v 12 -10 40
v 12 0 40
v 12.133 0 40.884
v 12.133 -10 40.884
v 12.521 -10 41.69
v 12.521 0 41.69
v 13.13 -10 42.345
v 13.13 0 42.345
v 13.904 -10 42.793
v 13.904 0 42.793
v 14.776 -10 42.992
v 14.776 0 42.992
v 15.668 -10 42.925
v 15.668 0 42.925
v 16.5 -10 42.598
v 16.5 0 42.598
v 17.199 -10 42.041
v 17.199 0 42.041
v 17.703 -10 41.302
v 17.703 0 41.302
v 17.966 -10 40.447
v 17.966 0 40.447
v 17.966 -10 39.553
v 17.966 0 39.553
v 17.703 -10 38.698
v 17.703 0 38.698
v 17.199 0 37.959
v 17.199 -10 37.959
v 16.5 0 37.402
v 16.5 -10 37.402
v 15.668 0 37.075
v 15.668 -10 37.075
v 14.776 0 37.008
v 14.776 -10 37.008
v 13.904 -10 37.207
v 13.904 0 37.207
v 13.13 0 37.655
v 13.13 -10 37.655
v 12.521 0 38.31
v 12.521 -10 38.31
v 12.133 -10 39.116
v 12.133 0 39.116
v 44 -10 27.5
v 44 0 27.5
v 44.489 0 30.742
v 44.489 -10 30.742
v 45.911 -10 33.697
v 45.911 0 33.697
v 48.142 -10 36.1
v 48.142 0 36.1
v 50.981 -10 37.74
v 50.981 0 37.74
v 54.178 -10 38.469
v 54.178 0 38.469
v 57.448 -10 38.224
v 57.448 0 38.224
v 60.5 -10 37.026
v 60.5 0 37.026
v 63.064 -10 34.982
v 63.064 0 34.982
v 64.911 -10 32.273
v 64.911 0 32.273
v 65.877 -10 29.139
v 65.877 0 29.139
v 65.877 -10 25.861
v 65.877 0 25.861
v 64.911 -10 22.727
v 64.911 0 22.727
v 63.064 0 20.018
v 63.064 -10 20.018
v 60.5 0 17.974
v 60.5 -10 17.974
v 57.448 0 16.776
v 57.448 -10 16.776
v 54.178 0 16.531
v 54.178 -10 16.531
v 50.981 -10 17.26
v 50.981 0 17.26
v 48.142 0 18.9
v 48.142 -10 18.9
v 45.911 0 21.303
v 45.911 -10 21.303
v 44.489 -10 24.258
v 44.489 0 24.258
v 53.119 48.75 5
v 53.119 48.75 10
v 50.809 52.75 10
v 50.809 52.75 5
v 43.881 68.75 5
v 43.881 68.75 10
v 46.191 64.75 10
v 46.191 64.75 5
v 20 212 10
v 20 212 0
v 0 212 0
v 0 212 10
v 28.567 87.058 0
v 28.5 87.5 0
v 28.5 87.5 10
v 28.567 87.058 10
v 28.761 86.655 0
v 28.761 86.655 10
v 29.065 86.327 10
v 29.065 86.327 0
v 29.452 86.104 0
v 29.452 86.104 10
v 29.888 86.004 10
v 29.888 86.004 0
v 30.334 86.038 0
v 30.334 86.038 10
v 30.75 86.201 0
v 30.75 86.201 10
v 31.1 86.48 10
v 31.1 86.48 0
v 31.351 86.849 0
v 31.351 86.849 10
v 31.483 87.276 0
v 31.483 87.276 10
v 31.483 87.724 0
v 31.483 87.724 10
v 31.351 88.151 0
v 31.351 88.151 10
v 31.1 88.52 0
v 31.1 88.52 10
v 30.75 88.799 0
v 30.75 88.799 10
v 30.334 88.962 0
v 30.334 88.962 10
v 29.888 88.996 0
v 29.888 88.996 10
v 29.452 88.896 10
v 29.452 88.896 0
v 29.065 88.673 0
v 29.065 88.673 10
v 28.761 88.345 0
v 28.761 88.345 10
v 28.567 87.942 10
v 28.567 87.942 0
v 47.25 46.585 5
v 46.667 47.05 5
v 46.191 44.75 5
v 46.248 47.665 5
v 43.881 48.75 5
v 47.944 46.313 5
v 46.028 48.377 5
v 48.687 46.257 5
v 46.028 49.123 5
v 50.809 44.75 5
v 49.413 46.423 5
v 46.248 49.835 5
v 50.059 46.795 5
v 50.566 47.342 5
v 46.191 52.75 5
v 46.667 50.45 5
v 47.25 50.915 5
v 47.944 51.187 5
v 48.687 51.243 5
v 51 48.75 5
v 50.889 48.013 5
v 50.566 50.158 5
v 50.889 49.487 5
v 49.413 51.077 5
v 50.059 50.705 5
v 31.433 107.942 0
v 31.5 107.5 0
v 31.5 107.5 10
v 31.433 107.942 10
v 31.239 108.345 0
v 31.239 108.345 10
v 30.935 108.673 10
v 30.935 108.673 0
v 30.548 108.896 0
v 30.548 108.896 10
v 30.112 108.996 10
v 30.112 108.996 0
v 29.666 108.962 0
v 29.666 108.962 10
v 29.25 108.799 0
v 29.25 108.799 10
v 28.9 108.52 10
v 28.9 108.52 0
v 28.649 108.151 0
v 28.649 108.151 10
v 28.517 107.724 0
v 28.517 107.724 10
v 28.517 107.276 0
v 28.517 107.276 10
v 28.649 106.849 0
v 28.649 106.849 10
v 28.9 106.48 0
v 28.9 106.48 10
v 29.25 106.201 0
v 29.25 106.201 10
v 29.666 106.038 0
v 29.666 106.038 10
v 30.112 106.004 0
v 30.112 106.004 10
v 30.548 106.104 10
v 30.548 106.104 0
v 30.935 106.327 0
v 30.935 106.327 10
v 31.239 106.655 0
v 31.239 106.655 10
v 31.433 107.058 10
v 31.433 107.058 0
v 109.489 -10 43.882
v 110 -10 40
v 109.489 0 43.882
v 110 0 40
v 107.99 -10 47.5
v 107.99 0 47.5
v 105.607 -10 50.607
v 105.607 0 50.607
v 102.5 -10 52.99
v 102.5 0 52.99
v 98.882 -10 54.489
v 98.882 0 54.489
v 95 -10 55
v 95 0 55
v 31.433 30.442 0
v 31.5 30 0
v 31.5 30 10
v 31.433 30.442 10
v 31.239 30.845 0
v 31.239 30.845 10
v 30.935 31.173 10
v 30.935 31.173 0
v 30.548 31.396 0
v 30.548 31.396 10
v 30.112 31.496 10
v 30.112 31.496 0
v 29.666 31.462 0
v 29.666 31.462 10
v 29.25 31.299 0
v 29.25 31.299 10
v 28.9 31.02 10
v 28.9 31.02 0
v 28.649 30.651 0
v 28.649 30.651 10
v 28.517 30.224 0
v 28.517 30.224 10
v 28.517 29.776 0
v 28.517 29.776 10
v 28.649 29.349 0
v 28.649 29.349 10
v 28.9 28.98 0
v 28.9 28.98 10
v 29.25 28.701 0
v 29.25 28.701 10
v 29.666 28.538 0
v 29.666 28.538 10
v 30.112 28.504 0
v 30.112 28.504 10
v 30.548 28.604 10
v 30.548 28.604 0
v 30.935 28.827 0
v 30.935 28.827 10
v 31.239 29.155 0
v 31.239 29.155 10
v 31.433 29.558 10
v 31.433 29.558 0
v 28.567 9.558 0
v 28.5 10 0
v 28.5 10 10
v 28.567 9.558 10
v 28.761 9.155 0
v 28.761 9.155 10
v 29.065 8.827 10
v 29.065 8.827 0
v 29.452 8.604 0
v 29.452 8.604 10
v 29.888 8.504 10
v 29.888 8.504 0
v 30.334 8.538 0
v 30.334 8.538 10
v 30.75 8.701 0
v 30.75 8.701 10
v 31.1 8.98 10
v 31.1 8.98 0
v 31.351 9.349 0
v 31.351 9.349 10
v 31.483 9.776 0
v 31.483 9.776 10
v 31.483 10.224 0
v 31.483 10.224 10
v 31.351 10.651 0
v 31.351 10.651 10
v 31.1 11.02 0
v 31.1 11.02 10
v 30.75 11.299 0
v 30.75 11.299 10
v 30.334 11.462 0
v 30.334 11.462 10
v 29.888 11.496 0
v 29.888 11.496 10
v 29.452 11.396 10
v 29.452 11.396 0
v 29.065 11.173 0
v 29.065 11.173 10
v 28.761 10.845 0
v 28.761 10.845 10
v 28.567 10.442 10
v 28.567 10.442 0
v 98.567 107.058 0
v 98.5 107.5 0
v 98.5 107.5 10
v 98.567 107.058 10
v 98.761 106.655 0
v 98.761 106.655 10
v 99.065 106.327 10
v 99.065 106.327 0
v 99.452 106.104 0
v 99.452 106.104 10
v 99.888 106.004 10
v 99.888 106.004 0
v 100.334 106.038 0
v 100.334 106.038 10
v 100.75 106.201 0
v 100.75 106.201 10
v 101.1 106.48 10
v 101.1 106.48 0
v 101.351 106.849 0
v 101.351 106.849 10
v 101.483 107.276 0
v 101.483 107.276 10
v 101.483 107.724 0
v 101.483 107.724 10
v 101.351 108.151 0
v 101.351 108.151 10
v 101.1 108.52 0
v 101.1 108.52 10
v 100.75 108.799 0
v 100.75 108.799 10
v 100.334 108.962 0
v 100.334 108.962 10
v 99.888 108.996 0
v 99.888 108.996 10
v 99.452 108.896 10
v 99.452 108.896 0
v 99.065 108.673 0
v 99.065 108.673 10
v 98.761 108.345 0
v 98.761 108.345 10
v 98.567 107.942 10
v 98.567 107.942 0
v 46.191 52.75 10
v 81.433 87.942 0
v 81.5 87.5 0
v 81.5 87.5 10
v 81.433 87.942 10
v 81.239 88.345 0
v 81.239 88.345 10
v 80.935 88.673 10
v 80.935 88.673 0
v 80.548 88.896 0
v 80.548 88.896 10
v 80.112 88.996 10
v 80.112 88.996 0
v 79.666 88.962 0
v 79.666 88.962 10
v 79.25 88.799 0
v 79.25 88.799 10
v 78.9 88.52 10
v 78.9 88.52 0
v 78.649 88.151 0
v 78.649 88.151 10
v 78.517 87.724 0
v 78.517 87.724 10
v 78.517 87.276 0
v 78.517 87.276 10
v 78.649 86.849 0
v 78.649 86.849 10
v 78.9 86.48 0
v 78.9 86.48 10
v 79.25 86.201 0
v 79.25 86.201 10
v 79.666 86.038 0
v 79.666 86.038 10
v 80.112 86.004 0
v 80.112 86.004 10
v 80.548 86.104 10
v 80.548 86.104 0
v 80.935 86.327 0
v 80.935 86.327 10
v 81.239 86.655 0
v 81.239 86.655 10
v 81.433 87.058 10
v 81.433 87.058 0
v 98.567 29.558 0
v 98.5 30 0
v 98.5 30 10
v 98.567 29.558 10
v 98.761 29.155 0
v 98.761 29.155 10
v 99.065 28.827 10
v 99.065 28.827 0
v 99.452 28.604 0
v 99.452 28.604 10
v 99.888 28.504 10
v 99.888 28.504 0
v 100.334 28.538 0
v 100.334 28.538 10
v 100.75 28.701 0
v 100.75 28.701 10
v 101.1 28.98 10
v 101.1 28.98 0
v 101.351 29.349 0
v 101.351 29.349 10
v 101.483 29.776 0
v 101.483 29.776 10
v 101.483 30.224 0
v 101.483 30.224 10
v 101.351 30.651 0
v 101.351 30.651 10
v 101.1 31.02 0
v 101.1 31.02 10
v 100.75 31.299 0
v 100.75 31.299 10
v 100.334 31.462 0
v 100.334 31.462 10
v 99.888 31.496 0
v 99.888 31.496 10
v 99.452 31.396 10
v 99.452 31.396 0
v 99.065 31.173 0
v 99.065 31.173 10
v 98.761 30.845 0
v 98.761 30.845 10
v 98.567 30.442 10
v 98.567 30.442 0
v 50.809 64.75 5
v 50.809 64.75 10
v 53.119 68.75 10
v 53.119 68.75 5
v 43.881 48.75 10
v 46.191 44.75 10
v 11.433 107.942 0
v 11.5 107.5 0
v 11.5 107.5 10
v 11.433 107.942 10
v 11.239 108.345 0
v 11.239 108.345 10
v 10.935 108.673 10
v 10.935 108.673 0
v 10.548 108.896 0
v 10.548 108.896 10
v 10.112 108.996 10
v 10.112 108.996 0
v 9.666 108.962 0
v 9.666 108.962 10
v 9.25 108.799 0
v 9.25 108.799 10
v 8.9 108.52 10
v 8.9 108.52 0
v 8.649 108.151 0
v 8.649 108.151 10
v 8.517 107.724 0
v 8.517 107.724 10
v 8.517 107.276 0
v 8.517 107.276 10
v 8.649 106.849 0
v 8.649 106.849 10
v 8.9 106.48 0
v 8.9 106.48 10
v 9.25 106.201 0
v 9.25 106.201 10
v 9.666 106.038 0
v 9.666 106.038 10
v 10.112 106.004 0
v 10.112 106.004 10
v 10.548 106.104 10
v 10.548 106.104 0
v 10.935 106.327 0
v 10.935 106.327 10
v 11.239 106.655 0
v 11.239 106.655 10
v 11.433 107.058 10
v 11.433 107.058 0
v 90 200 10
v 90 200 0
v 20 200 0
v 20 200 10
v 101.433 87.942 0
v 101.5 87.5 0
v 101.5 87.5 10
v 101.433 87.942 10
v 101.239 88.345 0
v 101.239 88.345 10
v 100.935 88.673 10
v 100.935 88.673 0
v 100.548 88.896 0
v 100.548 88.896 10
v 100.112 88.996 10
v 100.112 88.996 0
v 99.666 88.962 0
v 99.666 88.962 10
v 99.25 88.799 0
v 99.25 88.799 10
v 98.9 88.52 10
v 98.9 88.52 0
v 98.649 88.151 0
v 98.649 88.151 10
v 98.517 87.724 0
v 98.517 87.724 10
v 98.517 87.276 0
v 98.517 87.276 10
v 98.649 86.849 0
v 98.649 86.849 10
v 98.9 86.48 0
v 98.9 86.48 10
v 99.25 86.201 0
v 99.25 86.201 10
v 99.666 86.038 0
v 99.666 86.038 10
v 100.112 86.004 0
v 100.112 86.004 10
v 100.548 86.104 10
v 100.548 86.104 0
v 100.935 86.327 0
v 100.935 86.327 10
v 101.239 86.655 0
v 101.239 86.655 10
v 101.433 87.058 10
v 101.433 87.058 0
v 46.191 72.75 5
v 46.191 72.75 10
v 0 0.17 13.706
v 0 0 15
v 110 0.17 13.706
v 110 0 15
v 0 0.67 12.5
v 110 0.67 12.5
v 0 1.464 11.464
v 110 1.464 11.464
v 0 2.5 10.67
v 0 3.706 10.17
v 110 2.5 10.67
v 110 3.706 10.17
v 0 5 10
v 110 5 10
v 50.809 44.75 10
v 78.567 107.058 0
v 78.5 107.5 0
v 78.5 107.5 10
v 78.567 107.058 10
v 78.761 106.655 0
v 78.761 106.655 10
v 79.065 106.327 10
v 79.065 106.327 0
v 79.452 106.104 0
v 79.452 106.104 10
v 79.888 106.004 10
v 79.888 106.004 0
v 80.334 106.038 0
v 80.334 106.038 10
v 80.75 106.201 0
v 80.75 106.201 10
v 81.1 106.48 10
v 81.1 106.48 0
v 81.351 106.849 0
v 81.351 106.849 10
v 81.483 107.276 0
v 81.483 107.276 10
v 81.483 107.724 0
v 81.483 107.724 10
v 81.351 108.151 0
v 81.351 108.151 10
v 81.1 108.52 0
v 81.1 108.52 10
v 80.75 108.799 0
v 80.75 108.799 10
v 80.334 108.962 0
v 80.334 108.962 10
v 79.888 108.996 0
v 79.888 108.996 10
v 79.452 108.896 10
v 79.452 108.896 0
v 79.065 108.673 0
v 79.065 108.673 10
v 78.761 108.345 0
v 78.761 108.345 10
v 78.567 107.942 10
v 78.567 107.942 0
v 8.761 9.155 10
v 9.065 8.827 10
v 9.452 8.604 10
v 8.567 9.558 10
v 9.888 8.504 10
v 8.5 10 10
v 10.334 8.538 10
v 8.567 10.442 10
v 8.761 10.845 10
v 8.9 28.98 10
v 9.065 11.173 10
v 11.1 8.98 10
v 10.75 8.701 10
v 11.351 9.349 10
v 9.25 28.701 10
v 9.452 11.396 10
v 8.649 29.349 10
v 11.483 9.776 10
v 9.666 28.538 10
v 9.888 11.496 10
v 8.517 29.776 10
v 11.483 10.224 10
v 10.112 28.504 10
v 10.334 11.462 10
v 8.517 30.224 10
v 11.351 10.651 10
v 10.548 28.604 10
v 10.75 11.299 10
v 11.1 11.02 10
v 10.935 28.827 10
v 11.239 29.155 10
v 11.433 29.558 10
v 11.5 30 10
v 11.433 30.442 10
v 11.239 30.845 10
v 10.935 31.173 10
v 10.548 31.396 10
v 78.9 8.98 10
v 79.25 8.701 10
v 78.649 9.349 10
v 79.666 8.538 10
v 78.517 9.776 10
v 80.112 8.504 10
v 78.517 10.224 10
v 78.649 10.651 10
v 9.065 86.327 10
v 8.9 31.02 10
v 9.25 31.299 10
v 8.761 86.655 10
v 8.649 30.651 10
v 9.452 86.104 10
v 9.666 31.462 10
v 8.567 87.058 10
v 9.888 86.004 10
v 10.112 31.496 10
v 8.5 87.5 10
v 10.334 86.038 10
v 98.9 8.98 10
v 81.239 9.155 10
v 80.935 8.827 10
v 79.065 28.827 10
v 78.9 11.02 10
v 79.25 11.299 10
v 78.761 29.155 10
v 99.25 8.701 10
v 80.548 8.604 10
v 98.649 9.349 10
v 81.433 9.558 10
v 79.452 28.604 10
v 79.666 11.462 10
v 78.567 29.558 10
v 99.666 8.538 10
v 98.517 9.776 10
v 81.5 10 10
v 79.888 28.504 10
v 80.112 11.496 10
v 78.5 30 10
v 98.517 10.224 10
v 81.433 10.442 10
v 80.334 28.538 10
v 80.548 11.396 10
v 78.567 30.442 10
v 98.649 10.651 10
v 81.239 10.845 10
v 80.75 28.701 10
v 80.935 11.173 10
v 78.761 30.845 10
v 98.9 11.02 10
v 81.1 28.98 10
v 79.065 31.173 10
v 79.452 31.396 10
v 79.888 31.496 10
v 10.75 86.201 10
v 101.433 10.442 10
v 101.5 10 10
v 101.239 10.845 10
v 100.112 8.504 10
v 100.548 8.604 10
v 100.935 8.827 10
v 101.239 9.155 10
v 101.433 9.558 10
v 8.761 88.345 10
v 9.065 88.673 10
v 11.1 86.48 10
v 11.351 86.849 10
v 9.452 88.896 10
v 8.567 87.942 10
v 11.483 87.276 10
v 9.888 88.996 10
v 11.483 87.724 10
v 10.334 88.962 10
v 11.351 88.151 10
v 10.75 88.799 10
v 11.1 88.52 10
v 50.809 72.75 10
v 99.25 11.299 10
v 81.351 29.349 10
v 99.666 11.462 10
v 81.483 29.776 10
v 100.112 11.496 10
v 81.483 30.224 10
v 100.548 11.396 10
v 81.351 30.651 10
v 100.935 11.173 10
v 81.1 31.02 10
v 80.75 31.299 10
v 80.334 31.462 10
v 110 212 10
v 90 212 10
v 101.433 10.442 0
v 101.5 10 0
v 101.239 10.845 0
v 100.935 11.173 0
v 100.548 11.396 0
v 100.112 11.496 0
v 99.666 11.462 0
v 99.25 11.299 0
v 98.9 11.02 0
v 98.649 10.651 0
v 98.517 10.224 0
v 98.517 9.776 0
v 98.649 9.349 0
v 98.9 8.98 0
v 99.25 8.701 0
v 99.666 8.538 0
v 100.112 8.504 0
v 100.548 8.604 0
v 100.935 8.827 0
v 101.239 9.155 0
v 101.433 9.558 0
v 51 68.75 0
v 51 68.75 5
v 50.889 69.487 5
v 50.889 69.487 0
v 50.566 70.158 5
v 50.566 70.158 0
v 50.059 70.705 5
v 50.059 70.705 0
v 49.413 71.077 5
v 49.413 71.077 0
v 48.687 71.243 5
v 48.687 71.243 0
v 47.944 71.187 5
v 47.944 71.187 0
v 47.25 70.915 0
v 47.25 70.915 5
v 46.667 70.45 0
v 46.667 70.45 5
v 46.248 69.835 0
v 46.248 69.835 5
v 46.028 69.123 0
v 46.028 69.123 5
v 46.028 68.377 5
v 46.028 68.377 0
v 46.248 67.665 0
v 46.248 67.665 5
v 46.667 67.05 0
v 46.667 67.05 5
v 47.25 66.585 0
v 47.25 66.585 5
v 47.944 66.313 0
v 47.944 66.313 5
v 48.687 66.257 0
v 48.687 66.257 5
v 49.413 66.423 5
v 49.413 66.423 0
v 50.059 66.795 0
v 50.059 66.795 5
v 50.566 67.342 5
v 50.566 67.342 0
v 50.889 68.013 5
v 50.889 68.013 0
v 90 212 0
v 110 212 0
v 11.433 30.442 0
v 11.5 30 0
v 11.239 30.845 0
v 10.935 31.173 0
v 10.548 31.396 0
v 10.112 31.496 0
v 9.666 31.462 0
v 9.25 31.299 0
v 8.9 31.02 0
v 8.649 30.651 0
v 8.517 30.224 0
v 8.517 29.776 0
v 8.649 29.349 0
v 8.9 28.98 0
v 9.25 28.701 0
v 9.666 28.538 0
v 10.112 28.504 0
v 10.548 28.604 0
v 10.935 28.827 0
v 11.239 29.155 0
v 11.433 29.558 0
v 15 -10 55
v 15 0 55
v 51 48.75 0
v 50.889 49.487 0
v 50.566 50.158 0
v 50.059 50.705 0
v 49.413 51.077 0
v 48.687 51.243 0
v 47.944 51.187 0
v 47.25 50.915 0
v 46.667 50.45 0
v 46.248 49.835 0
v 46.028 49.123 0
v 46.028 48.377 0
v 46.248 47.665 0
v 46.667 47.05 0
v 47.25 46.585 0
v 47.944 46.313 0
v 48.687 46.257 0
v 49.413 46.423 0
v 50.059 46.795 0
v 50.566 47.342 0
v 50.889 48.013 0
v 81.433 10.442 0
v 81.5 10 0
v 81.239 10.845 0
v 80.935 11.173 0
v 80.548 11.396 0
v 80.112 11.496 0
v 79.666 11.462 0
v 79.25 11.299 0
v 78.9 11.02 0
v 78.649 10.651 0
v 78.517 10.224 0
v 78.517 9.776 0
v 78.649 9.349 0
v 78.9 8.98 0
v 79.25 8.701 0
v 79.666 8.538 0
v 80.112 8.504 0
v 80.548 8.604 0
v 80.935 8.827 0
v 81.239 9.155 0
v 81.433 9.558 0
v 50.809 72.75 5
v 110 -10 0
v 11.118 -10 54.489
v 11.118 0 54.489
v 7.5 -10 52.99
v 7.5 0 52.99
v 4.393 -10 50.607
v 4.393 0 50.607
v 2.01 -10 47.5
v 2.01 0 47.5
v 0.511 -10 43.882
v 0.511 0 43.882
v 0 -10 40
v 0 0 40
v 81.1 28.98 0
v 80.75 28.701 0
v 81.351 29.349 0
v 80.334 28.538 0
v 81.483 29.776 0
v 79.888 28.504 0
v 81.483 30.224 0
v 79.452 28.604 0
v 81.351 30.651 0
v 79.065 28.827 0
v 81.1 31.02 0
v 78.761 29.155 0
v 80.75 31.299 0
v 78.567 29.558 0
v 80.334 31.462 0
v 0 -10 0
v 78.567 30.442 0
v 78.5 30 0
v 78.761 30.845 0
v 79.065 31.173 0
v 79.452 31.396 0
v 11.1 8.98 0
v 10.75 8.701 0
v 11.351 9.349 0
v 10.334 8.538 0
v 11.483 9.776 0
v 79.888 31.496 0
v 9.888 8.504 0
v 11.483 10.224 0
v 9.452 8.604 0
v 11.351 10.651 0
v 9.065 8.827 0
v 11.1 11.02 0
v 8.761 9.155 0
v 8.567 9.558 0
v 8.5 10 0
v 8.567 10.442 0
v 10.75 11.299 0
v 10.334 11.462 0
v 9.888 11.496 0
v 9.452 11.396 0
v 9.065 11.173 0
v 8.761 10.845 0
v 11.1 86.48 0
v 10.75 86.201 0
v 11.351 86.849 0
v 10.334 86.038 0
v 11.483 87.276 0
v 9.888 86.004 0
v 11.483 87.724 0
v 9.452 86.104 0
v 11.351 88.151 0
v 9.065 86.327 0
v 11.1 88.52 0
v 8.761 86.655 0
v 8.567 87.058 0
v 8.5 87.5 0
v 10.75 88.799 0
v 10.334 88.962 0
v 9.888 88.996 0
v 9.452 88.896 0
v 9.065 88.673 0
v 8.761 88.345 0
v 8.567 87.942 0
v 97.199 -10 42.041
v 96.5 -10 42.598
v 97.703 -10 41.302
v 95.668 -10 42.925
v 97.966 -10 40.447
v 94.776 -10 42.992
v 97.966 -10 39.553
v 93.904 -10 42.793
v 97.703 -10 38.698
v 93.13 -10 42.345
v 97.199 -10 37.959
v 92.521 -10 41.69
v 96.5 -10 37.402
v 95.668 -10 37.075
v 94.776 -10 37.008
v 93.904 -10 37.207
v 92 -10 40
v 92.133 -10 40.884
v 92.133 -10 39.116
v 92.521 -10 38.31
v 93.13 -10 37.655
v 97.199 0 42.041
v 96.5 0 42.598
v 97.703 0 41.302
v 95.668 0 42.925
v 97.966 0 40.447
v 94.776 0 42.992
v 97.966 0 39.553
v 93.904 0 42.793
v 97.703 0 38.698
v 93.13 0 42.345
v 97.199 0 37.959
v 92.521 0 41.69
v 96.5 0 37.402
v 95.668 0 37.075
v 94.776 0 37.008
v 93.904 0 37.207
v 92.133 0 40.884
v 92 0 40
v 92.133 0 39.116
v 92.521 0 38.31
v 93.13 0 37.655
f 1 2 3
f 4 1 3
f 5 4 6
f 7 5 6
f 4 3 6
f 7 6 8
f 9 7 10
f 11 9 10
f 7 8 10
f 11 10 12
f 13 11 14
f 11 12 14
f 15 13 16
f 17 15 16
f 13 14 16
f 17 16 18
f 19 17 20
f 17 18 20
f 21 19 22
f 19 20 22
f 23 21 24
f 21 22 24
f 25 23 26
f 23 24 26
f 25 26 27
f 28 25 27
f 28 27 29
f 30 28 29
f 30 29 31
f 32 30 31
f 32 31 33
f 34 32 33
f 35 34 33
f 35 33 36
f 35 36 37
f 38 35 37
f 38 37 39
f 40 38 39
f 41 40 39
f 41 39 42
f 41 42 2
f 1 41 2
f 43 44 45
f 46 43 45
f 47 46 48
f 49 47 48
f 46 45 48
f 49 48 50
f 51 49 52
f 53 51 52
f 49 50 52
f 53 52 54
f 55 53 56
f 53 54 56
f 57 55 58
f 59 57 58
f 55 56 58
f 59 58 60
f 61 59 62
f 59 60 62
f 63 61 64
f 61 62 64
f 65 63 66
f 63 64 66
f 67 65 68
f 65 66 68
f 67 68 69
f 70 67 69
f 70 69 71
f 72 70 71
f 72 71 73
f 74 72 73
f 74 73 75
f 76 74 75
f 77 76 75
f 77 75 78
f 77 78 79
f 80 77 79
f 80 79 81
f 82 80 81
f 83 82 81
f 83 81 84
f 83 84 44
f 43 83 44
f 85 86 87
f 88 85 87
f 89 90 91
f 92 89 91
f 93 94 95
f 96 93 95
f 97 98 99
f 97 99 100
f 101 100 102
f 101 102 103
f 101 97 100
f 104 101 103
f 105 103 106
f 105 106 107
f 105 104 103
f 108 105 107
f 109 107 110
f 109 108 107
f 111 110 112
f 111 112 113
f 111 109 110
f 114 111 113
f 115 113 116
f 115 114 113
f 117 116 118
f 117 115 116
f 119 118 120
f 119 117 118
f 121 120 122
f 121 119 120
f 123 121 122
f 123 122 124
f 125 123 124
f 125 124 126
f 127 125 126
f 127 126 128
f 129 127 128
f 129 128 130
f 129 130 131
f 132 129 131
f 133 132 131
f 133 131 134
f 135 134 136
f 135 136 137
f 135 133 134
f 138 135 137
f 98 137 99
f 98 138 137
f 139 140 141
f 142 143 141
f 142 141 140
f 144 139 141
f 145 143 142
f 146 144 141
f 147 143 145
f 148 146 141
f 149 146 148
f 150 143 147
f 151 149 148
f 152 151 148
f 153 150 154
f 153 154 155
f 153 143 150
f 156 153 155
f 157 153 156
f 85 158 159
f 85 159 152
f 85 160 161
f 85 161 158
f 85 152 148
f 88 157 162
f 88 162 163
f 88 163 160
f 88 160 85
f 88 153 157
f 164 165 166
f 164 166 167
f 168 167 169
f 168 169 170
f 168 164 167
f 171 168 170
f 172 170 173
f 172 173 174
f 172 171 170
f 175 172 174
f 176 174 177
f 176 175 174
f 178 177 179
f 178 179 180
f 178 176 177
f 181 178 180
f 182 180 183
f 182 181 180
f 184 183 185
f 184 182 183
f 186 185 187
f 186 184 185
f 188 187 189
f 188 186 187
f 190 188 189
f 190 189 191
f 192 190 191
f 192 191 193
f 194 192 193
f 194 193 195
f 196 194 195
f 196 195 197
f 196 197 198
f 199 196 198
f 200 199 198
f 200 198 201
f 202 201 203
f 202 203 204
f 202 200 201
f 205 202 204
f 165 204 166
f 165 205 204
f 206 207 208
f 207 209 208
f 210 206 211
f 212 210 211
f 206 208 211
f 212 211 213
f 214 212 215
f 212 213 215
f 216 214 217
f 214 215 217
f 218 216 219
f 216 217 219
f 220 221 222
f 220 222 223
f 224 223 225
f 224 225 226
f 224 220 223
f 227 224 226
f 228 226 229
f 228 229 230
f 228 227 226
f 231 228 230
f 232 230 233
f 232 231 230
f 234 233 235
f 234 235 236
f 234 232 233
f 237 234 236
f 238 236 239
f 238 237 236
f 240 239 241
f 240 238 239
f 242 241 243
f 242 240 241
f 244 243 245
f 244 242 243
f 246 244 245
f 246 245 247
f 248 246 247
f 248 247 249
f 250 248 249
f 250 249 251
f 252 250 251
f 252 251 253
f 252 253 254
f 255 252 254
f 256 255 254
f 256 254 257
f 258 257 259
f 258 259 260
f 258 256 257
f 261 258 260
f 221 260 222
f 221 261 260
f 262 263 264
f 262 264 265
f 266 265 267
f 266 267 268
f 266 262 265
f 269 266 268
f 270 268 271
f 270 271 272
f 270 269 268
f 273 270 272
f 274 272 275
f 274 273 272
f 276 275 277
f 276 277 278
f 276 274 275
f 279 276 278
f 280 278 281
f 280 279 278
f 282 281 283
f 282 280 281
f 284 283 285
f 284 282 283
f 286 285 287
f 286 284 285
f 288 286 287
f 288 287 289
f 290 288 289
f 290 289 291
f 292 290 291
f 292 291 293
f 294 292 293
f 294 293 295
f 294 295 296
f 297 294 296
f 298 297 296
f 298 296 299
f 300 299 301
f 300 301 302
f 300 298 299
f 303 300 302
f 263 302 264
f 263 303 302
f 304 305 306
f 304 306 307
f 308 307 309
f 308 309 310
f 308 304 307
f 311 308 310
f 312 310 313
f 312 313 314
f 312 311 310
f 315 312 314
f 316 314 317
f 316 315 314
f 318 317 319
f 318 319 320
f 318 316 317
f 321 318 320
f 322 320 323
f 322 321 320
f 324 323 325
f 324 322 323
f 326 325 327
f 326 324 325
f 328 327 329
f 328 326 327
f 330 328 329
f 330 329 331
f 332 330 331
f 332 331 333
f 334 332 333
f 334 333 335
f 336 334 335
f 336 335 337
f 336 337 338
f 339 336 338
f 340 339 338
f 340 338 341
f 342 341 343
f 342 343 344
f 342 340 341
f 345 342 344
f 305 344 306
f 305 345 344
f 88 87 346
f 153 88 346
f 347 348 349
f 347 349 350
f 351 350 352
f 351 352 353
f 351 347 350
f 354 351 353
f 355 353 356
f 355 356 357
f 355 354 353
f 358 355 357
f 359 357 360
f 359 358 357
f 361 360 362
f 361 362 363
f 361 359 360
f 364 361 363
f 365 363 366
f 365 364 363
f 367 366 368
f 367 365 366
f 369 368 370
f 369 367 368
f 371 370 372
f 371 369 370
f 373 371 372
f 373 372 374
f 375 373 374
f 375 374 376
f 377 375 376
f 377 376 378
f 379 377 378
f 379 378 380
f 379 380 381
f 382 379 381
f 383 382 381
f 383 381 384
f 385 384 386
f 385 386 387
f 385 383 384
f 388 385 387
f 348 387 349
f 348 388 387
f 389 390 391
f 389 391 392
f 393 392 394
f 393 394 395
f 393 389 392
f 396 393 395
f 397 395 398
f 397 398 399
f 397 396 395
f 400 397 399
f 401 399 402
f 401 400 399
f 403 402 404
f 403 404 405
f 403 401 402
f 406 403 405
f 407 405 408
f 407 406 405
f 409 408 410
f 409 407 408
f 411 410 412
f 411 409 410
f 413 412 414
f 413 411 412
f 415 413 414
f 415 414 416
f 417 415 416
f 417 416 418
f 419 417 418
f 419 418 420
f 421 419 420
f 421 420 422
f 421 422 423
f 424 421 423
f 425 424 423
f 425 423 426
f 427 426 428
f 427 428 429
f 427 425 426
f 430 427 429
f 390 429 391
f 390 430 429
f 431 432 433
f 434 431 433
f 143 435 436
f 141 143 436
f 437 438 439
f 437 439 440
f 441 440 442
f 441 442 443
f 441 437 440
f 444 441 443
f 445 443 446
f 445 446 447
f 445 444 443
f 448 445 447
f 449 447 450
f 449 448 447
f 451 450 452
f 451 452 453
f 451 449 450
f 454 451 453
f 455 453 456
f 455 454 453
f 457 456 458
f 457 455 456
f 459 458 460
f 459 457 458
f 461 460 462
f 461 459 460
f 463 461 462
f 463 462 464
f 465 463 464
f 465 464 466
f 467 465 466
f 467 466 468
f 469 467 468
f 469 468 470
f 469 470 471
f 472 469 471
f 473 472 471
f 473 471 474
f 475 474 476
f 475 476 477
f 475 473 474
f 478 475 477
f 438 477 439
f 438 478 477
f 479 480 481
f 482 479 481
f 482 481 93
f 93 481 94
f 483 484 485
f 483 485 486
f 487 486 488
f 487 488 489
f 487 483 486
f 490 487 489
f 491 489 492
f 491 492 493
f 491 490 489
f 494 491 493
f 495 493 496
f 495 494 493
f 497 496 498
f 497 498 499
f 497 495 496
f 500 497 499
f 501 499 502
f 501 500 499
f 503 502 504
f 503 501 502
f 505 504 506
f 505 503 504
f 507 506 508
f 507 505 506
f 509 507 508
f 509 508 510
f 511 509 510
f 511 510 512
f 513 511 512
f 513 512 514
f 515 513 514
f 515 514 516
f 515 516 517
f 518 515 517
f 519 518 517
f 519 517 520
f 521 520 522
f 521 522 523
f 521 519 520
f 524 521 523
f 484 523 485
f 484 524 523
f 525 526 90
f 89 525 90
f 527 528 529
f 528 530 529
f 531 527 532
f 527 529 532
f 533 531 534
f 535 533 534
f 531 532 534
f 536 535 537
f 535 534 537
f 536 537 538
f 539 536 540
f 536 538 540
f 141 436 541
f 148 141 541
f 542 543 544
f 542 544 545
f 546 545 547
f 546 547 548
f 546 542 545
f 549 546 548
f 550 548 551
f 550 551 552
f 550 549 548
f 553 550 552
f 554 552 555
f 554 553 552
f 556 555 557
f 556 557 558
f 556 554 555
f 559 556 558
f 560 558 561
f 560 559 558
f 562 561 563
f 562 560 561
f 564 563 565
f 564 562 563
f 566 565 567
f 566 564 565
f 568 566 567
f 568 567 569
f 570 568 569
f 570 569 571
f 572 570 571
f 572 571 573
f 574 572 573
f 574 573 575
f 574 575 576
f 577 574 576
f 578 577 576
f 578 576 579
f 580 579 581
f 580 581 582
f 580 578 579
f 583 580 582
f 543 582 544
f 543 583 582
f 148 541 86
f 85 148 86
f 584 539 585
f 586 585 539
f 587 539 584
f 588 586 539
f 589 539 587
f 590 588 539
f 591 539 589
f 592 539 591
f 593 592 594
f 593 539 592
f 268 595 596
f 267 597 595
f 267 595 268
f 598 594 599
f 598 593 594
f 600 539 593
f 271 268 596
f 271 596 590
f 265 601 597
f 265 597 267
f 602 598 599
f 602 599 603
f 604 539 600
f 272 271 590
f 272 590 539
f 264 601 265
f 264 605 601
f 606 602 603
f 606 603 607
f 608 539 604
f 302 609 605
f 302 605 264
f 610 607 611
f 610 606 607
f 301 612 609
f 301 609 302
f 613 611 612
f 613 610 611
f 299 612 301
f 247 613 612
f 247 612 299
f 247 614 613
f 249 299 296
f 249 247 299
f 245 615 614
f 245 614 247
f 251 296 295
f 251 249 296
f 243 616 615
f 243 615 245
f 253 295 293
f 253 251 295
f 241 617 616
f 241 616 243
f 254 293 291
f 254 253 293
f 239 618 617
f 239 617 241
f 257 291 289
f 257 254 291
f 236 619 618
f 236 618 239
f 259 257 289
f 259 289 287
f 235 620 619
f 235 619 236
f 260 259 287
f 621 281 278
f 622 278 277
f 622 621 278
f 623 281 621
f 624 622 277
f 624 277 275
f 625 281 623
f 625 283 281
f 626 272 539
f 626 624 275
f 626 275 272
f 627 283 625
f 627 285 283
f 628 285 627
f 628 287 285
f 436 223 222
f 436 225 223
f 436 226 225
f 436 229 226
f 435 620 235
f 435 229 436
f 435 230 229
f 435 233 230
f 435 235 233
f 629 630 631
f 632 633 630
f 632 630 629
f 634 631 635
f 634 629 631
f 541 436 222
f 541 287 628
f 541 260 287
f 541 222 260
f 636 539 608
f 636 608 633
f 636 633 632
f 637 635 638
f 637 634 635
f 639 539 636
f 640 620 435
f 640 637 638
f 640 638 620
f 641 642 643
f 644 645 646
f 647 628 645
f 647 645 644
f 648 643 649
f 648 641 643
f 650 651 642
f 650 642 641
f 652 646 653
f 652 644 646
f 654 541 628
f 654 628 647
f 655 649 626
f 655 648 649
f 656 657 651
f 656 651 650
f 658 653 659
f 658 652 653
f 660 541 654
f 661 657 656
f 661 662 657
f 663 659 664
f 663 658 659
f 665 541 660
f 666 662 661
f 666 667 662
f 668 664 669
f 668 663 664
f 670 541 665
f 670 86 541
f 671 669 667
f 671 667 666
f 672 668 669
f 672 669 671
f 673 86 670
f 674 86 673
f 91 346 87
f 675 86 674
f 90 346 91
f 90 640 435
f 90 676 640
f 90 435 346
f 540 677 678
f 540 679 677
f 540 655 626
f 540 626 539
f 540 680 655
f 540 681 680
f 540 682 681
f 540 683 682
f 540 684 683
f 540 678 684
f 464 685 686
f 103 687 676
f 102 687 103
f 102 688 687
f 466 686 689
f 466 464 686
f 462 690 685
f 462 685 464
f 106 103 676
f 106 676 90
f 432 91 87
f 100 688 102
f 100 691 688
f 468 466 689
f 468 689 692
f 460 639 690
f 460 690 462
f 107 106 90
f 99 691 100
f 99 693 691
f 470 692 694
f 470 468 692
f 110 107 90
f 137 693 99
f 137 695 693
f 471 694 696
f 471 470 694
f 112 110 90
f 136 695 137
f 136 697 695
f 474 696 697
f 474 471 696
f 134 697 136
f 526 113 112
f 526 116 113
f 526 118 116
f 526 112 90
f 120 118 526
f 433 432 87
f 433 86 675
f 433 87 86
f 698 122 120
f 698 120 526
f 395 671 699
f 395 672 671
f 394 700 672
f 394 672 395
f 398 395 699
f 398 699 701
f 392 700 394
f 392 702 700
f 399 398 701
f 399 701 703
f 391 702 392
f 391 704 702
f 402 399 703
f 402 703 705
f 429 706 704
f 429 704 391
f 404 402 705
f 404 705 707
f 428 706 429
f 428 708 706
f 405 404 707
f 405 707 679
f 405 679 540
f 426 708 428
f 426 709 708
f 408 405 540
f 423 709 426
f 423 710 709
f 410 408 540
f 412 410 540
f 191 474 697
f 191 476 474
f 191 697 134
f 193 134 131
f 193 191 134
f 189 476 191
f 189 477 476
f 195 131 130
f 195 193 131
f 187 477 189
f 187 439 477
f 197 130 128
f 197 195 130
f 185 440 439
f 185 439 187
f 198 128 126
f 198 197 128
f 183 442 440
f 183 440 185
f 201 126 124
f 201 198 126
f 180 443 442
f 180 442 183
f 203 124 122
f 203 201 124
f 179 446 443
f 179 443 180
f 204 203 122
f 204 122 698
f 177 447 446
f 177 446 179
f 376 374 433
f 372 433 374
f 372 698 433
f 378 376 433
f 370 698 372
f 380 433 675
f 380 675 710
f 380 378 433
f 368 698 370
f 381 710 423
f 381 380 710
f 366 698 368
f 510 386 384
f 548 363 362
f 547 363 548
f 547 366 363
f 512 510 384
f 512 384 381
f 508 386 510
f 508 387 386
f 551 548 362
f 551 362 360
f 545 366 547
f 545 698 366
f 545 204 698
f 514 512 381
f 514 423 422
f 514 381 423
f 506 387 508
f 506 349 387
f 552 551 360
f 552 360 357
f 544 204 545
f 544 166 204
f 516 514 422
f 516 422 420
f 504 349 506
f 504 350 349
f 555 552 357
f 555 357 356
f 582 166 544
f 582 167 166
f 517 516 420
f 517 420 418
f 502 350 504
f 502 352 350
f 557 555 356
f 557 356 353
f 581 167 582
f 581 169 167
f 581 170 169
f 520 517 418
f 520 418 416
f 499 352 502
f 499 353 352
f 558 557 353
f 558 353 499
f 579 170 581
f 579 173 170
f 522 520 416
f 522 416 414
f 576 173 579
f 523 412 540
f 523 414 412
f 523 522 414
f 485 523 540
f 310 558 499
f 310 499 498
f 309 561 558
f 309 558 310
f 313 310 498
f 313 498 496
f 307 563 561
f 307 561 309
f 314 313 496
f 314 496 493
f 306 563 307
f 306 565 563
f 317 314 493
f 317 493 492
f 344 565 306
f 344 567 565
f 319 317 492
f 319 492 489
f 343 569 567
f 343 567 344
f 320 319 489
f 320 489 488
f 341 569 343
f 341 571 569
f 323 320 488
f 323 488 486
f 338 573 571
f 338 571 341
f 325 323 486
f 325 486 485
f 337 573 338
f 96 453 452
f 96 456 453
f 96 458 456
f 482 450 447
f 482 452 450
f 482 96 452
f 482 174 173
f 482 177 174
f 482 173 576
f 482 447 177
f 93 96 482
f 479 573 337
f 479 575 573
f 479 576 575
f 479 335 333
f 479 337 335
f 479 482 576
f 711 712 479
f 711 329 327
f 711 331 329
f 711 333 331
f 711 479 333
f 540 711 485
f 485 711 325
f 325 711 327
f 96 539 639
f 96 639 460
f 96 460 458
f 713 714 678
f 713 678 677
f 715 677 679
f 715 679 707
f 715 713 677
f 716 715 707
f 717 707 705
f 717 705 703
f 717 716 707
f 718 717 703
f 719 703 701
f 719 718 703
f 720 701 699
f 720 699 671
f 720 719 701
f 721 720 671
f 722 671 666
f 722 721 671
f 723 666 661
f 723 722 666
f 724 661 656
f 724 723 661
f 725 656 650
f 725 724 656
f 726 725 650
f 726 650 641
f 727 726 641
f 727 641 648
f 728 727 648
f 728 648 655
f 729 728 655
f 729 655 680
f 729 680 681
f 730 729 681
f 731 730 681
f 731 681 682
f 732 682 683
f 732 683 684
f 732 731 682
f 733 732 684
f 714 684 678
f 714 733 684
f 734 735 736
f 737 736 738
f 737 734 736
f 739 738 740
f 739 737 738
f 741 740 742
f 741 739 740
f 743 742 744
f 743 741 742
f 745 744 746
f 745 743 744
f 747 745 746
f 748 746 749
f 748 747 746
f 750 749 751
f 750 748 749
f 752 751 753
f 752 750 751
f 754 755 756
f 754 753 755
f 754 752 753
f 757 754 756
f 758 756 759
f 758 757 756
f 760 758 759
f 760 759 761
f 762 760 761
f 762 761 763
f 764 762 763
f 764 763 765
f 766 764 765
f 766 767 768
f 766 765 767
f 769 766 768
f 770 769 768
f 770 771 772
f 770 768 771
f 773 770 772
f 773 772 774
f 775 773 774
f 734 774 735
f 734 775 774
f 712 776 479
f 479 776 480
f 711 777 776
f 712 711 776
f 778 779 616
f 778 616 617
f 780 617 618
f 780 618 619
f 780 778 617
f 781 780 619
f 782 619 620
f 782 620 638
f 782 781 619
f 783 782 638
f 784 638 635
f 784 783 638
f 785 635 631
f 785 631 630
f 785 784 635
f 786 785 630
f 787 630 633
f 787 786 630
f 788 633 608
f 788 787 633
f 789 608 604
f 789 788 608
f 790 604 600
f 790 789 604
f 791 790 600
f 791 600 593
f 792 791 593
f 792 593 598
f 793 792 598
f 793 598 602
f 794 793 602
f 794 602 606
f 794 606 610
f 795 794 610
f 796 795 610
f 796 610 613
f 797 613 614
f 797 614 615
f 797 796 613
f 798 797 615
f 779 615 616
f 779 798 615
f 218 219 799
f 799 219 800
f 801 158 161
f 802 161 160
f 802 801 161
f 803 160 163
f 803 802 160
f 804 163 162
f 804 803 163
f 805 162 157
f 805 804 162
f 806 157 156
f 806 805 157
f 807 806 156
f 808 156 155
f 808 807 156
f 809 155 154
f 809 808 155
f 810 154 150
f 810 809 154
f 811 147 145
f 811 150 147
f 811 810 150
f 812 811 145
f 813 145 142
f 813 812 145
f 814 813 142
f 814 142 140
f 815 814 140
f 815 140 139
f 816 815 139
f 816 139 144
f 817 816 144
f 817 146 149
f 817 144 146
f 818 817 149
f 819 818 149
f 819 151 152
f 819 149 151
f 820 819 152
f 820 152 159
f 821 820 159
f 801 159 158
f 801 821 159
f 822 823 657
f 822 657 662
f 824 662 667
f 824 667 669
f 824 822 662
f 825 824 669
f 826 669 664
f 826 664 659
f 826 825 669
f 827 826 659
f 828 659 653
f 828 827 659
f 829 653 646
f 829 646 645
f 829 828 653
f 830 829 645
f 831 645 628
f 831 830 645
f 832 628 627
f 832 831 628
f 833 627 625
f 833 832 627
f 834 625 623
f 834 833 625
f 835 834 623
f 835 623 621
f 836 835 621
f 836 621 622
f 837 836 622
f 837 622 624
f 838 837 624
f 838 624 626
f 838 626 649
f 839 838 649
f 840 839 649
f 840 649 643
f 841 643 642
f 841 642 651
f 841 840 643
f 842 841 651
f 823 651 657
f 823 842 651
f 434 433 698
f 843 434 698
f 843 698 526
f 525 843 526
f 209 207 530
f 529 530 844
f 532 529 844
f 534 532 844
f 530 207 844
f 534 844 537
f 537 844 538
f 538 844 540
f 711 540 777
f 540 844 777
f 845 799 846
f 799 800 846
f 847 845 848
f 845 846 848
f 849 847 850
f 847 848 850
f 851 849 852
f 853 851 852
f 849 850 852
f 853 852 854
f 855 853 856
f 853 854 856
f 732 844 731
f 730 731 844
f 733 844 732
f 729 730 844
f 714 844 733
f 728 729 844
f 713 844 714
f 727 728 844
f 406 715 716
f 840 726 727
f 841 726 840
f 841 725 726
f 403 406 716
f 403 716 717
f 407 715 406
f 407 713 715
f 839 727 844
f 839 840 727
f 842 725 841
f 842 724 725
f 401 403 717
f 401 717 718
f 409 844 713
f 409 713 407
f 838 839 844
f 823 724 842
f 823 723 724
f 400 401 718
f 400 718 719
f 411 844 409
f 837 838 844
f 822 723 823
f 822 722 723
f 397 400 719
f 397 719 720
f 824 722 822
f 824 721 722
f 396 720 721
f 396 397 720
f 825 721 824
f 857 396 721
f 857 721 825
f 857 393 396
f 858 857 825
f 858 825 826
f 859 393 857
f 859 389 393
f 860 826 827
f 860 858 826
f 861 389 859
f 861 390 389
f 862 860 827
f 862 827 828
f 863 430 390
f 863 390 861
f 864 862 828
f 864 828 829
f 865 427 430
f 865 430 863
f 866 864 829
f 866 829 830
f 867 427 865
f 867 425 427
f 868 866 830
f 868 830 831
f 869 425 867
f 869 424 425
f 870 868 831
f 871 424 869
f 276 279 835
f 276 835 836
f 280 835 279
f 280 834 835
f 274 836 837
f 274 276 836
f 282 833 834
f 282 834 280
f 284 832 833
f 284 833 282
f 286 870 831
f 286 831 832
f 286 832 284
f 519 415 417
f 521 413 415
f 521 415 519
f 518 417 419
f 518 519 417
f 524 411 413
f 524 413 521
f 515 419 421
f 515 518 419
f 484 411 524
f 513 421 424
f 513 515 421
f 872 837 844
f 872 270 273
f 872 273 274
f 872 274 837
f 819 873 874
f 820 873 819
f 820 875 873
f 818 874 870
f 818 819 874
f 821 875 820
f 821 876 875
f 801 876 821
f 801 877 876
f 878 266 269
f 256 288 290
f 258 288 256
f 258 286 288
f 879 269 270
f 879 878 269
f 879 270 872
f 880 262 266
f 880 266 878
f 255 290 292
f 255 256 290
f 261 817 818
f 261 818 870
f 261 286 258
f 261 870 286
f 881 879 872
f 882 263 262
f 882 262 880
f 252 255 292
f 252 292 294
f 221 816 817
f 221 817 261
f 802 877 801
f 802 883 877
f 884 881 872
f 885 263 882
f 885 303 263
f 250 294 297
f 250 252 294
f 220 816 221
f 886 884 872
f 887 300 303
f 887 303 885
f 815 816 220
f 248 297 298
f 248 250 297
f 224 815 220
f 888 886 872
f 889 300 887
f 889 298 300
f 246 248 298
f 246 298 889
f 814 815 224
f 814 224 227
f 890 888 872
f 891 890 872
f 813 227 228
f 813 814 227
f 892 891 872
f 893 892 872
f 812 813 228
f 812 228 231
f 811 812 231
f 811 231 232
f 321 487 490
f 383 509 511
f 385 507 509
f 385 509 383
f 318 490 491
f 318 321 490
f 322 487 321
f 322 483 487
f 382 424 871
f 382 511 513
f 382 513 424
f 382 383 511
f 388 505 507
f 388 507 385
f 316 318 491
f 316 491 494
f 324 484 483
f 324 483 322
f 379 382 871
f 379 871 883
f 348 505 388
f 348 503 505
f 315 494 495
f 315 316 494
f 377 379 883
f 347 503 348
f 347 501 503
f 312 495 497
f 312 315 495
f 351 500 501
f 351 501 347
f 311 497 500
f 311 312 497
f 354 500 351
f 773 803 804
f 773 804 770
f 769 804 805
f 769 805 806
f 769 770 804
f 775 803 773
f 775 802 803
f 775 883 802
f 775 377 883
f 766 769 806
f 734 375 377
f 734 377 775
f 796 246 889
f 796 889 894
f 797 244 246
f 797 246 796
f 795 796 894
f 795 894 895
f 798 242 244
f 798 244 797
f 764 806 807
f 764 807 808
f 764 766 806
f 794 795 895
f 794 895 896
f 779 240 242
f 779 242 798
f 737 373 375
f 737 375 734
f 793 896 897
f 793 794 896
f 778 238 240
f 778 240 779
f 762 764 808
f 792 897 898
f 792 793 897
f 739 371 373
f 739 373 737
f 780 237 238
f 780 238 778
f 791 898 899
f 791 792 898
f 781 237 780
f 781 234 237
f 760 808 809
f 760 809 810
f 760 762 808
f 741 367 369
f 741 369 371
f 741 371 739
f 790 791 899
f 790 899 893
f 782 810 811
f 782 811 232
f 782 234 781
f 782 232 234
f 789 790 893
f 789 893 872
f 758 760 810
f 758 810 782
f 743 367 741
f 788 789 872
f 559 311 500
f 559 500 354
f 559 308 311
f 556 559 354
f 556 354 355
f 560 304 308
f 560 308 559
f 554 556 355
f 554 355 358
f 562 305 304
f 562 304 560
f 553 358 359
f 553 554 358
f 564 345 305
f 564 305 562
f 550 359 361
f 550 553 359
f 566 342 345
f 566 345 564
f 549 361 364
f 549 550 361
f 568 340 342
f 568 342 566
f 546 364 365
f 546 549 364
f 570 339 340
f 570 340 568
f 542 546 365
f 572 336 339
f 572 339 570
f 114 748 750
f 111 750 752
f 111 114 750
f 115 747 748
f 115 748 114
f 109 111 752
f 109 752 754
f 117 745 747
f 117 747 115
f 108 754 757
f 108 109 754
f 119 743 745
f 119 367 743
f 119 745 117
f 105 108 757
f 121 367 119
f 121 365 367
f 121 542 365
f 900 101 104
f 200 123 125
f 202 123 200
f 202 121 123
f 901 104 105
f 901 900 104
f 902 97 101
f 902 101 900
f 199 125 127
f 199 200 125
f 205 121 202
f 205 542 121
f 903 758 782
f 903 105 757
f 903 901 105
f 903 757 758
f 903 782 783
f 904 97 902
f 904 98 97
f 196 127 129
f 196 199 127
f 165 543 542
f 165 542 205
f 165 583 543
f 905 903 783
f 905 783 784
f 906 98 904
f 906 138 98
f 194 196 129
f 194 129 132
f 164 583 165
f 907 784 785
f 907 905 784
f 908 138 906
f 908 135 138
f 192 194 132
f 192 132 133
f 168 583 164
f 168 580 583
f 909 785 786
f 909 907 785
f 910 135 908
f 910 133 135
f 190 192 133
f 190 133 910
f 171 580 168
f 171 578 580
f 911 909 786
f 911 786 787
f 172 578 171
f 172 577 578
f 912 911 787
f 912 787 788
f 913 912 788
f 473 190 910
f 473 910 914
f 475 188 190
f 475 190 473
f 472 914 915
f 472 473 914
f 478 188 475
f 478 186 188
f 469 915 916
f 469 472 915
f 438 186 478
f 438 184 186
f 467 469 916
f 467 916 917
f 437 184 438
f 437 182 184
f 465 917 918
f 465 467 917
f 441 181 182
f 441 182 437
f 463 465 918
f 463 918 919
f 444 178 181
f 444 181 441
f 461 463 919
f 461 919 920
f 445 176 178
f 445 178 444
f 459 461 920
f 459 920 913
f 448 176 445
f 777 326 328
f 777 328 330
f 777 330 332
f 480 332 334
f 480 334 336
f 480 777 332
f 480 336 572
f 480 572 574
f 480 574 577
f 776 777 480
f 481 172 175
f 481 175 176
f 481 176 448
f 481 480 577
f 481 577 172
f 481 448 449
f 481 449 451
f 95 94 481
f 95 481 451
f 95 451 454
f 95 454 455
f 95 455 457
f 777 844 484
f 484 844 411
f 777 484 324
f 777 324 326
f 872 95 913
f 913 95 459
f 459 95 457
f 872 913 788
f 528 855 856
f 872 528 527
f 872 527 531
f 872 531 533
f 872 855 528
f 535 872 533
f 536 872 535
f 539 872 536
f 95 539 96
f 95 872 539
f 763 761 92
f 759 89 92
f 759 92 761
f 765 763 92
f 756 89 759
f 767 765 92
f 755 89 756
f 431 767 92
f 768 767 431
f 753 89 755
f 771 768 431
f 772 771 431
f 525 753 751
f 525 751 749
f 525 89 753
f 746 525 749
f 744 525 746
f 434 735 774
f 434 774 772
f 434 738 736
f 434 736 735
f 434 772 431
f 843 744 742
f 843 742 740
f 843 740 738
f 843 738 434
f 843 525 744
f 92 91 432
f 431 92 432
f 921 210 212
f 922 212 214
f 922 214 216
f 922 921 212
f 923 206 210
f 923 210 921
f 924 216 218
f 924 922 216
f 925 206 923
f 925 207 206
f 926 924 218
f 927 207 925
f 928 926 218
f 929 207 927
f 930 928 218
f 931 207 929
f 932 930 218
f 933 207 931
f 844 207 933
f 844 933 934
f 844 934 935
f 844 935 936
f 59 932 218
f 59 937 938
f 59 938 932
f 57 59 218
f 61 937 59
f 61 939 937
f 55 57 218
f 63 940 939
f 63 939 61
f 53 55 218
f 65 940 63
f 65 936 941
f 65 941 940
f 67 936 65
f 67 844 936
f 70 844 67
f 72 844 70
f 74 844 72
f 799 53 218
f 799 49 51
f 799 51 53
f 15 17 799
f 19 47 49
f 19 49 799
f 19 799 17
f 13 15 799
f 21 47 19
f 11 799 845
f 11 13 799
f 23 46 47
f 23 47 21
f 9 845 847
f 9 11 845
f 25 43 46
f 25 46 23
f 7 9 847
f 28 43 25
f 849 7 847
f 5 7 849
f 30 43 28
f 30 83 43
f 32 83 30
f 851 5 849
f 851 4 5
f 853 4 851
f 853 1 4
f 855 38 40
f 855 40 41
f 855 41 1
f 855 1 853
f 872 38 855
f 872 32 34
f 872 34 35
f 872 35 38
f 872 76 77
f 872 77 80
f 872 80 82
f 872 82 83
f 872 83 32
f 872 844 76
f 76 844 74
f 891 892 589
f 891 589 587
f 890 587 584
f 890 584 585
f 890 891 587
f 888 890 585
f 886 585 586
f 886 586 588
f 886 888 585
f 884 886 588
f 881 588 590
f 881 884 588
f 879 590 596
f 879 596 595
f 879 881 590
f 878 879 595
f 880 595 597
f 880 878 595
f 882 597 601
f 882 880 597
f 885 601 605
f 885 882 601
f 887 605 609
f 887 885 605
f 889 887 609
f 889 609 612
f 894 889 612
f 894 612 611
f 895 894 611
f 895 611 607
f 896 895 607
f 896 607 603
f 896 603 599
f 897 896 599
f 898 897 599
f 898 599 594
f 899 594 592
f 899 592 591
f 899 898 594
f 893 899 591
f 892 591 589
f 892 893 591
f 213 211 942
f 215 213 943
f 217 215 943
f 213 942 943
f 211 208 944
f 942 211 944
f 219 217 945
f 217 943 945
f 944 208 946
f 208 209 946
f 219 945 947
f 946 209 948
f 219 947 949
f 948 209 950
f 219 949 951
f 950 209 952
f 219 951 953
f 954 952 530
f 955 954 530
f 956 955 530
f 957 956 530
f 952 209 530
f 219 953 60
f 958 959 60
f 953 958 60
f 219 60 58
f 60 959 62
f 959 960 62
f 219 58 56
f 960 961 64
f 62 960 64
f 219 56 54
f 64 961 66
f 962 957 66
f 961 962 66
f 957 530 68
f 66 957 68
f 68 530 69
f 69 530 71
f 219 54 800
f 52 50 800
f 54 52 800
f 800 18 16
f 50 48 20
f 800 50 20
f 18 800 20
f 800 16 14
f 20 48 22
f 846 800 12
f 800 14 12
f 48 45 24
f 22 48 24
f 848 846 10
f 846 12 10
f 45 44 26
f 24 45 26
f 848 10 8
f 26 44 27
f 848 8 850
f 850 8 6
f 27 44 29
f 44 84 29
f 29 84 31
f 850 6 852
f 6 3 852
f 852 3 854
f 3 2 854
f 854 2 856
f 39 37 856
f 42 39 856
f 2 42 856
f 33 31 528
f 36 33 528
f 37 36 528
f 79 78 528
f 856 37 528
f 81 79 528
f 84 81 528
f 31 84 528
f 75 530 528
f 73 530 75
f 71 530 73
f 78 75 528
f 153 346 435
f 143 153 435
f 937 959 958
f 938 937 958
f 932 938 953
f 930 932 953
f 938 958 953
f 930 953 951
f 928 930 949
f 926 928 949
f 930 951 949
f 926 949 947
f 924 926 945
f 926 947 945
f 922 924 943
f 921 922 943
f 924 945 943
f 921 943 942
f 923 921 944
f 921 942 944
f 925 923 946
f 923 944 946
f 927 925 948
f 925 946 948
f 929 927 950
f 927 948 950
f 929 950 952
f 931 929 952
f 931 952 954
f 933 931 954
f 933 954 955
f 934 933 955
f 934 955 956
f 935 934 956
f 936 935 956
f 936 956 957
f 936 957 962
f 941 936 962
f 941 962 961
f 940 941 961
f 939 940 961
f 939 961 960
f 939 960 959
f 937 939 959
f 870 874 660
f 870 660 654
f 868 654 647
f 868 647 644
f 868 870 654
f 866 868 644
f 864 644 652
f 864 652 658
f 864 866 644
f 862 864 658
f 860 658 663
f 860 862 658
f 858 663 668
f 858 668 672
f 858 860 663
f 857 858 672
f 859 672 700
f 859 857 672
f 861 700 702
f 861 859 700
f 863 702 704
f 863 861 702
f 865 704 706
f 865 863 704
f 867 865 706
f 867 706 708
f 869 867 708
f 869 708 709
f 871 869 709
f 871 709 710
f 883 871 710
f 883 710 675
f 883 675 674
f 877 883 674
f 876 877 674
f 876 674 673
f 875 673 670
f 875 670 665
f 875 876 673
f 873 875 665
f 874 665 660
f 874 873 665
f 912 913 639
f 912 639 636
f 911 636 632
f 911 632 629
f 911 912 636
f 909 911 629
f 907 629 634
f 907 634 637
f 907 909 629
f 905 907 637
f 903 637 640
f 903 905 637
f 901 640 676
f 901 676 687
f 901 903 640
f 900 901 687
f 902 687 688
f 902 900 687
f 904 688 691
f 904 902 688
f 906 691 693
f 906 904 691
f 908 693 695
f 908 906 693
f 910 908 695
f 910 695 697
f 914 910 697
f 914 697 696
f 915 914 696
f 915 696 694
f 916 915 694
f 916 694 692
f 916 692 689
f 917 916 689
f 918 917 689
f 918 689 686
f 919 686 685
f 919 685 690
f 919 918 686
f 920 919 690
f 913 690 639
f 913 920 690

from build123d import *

# Parameters (mm, degrees)
SKETCH1_R           = 1.5
SKETCH1_R_2         = 2.5
BOSS_EXTRUDE1_DEPTH = 10
SKETCH4_W           = 110
SKETCH4_H           = 10
BOSS_EXTRUDE2_DEPTH = 55
SKETCH6_R           = 3
SKETCH6_R_2         = 11
CUT_EXTRUDE1_DEPTH  = 246.089779469
FILLET1_R           = 5
FILLET2_R           = 15
CUT_EXTRUDE2_DEPTH  = 5


with BuildPart() as part:
    # Sketch1 → Boss-Extrude1 (new body)
    with BuildSketch(Plane.XY):
        Polygon((20, 0), (90, 0), (110, 0), (110, 200), (110, 212), (90, 212), (90, 200), (20, 200), (20, 212), (0, 212), (0, 200), (0, 0), align=None)
        with Locations((100, 10)):
            Circle(SKETCH1_R, mode=Mode.SUBTRACT)
        with Locations((80, 10)):
            Circle(SKETCH1_R, mode=Mode.SUBTRACT)
        with Locations(Location((100, 30, 0), (0, 0, 180))):
            Circle(SKETCH1_R, mode=Mode.SUBTRACT)
        with Locations(Location((80, 30, 0), (0, 0, 180))):
            Circle(SKETCH1_R, mode=Mode.SUBTRACT)
        with Locations(Location((30, 10, 0), (0, 0, 180))):
            Circle(SKETCH1_R, mode=Mode.SUBTRACT)
        with Locations(Location((10, 10, 0), (0, 0, 180))):
            Circle(SKETCH1_R, mode=Mode.SUBTRACT)
        with Locations((10, 30)):
            Circle(SKETCH1_R, mode=Mode.SUBTRACT)
        with Locations((30, 30)):
            Circle(SKETCH1_R, mode=Mode.SUBTRACT)
        with Locations(Location((100, 107.5, 0), (0, 0, 180))):
            Circle(SKETCH1_R, mode=Mode.SUBTRACT)
        with Locations((100, 87.5)):
            Circle(SKETCH1_R, mode=Mode.SUBTRACT)
        with Locations((80, 87.5)):
            Circle(SKETCH1_R, mode=Mode.SUBTRACT)
        with Locations(Location((80, 107.5, 0), (0, 0, 180))):
            Circle(SKETCH1_R, mode=Mode.SUBTRACT)
        with Locations((30, 107.5)):
            Circle(SKETCH1_R, mode=Mode.SUBTRACT)
        with Locations((10, 107.5)):
            Circle(SKETCH1_R, mode=Mode.SUBTRACT)
        with Locations(Location((30, 87.5, 0), (0, 0, 180))):
            Circle(SKETCH1_R, mode=Mode.SUBTRACT)
        with Locations(Location((10, 87.5, 0), (0, 0, 180))):
            Circle(SKETCH1_R, mode=Mode.SUBTRACT)
        with Locations((48.5, 68.75)):
            Circle(SKETCH1_R_2, mode=Mode.SUBTRACT)
        with Locations((48.5, 48.75)):
            Circle(SKETCH1_R_2, mode=Mode.SUBTRACT)
    extrude(amount=BOSS_EXTRUDE1_DEPTH)

    # Sketch4 → Boss-Extrude2 (add)
    with BuildSketch(Plane(origin=(0, 0, 0), x_dir=(-1, 0, 0), z_dir=(0, 0, -1))):
        with Locations((-55, -5)):
            Rectangle(SKETCH4_W, SKETCH4_H)
    extrude(amount=-BOSS_EXTRUDE2_DEPTH)

    # Sketch6 → Cut-Extrude1 (cut, through all)
    with BuildSketch(Plane(origin=(0, 0, 0), x_dir=(1, 0, 0), z_dir=(0, 1, 0))):
        with Locations(Location((95, -40, 0), (0, 0, 180))):
            Circle(SKETCH6_R)
        with Locations(Location((15, -40, 0), (0, 0, 180))):
            Circle(SKETCH6_R)
        with Locations(Location((55, -27.5, 0), (0, 0, 180))):
            Circle(SKETCH6_R_2)
    extrude(amount=-CUT_EXTRUDE1_DEPTH, mode=Mode.SUBTRACT)

    # Fillet1
    fillet1_edges = [part.edges().sort_by_distance(p)[0] for p in [
        (55, 0, 10),
    ]]
    fillet(fillet1_edges, radius=FILLET1_R)

    # Fillet2
    fillet2_edges = [part.edges().sort_by_distance(p)[0] for p in [
        (0, -5, 55),
        (110, -5, 55),
    ]]
    fillet(fillet2_edges, radius=FILLET2_R)

    # Sketch7 → Cut-Extrude2 (cut)
    with BuildSketch(Plane.XY.offset(10)):
        Polygon((46.190598923, 72.75), (43.881197846, 68.75), (46.190598923, 64.75), (50.809401077, 64.75), (53.118802154, 68.75), (50.809401077, 72.75), align=None)
        Polygon((50.809401077, 52.75), (46.190598923, 52.75), (43.881197846, 48.75), (46.190598923, 44.75), (50.809401077, 44.75), (53.118802154, 48.75), align=None)
    extrude(amount=-CUT_EXTRUDE2_DEPTH, mode=Mode.SUBTRACT)


solid = part.part
